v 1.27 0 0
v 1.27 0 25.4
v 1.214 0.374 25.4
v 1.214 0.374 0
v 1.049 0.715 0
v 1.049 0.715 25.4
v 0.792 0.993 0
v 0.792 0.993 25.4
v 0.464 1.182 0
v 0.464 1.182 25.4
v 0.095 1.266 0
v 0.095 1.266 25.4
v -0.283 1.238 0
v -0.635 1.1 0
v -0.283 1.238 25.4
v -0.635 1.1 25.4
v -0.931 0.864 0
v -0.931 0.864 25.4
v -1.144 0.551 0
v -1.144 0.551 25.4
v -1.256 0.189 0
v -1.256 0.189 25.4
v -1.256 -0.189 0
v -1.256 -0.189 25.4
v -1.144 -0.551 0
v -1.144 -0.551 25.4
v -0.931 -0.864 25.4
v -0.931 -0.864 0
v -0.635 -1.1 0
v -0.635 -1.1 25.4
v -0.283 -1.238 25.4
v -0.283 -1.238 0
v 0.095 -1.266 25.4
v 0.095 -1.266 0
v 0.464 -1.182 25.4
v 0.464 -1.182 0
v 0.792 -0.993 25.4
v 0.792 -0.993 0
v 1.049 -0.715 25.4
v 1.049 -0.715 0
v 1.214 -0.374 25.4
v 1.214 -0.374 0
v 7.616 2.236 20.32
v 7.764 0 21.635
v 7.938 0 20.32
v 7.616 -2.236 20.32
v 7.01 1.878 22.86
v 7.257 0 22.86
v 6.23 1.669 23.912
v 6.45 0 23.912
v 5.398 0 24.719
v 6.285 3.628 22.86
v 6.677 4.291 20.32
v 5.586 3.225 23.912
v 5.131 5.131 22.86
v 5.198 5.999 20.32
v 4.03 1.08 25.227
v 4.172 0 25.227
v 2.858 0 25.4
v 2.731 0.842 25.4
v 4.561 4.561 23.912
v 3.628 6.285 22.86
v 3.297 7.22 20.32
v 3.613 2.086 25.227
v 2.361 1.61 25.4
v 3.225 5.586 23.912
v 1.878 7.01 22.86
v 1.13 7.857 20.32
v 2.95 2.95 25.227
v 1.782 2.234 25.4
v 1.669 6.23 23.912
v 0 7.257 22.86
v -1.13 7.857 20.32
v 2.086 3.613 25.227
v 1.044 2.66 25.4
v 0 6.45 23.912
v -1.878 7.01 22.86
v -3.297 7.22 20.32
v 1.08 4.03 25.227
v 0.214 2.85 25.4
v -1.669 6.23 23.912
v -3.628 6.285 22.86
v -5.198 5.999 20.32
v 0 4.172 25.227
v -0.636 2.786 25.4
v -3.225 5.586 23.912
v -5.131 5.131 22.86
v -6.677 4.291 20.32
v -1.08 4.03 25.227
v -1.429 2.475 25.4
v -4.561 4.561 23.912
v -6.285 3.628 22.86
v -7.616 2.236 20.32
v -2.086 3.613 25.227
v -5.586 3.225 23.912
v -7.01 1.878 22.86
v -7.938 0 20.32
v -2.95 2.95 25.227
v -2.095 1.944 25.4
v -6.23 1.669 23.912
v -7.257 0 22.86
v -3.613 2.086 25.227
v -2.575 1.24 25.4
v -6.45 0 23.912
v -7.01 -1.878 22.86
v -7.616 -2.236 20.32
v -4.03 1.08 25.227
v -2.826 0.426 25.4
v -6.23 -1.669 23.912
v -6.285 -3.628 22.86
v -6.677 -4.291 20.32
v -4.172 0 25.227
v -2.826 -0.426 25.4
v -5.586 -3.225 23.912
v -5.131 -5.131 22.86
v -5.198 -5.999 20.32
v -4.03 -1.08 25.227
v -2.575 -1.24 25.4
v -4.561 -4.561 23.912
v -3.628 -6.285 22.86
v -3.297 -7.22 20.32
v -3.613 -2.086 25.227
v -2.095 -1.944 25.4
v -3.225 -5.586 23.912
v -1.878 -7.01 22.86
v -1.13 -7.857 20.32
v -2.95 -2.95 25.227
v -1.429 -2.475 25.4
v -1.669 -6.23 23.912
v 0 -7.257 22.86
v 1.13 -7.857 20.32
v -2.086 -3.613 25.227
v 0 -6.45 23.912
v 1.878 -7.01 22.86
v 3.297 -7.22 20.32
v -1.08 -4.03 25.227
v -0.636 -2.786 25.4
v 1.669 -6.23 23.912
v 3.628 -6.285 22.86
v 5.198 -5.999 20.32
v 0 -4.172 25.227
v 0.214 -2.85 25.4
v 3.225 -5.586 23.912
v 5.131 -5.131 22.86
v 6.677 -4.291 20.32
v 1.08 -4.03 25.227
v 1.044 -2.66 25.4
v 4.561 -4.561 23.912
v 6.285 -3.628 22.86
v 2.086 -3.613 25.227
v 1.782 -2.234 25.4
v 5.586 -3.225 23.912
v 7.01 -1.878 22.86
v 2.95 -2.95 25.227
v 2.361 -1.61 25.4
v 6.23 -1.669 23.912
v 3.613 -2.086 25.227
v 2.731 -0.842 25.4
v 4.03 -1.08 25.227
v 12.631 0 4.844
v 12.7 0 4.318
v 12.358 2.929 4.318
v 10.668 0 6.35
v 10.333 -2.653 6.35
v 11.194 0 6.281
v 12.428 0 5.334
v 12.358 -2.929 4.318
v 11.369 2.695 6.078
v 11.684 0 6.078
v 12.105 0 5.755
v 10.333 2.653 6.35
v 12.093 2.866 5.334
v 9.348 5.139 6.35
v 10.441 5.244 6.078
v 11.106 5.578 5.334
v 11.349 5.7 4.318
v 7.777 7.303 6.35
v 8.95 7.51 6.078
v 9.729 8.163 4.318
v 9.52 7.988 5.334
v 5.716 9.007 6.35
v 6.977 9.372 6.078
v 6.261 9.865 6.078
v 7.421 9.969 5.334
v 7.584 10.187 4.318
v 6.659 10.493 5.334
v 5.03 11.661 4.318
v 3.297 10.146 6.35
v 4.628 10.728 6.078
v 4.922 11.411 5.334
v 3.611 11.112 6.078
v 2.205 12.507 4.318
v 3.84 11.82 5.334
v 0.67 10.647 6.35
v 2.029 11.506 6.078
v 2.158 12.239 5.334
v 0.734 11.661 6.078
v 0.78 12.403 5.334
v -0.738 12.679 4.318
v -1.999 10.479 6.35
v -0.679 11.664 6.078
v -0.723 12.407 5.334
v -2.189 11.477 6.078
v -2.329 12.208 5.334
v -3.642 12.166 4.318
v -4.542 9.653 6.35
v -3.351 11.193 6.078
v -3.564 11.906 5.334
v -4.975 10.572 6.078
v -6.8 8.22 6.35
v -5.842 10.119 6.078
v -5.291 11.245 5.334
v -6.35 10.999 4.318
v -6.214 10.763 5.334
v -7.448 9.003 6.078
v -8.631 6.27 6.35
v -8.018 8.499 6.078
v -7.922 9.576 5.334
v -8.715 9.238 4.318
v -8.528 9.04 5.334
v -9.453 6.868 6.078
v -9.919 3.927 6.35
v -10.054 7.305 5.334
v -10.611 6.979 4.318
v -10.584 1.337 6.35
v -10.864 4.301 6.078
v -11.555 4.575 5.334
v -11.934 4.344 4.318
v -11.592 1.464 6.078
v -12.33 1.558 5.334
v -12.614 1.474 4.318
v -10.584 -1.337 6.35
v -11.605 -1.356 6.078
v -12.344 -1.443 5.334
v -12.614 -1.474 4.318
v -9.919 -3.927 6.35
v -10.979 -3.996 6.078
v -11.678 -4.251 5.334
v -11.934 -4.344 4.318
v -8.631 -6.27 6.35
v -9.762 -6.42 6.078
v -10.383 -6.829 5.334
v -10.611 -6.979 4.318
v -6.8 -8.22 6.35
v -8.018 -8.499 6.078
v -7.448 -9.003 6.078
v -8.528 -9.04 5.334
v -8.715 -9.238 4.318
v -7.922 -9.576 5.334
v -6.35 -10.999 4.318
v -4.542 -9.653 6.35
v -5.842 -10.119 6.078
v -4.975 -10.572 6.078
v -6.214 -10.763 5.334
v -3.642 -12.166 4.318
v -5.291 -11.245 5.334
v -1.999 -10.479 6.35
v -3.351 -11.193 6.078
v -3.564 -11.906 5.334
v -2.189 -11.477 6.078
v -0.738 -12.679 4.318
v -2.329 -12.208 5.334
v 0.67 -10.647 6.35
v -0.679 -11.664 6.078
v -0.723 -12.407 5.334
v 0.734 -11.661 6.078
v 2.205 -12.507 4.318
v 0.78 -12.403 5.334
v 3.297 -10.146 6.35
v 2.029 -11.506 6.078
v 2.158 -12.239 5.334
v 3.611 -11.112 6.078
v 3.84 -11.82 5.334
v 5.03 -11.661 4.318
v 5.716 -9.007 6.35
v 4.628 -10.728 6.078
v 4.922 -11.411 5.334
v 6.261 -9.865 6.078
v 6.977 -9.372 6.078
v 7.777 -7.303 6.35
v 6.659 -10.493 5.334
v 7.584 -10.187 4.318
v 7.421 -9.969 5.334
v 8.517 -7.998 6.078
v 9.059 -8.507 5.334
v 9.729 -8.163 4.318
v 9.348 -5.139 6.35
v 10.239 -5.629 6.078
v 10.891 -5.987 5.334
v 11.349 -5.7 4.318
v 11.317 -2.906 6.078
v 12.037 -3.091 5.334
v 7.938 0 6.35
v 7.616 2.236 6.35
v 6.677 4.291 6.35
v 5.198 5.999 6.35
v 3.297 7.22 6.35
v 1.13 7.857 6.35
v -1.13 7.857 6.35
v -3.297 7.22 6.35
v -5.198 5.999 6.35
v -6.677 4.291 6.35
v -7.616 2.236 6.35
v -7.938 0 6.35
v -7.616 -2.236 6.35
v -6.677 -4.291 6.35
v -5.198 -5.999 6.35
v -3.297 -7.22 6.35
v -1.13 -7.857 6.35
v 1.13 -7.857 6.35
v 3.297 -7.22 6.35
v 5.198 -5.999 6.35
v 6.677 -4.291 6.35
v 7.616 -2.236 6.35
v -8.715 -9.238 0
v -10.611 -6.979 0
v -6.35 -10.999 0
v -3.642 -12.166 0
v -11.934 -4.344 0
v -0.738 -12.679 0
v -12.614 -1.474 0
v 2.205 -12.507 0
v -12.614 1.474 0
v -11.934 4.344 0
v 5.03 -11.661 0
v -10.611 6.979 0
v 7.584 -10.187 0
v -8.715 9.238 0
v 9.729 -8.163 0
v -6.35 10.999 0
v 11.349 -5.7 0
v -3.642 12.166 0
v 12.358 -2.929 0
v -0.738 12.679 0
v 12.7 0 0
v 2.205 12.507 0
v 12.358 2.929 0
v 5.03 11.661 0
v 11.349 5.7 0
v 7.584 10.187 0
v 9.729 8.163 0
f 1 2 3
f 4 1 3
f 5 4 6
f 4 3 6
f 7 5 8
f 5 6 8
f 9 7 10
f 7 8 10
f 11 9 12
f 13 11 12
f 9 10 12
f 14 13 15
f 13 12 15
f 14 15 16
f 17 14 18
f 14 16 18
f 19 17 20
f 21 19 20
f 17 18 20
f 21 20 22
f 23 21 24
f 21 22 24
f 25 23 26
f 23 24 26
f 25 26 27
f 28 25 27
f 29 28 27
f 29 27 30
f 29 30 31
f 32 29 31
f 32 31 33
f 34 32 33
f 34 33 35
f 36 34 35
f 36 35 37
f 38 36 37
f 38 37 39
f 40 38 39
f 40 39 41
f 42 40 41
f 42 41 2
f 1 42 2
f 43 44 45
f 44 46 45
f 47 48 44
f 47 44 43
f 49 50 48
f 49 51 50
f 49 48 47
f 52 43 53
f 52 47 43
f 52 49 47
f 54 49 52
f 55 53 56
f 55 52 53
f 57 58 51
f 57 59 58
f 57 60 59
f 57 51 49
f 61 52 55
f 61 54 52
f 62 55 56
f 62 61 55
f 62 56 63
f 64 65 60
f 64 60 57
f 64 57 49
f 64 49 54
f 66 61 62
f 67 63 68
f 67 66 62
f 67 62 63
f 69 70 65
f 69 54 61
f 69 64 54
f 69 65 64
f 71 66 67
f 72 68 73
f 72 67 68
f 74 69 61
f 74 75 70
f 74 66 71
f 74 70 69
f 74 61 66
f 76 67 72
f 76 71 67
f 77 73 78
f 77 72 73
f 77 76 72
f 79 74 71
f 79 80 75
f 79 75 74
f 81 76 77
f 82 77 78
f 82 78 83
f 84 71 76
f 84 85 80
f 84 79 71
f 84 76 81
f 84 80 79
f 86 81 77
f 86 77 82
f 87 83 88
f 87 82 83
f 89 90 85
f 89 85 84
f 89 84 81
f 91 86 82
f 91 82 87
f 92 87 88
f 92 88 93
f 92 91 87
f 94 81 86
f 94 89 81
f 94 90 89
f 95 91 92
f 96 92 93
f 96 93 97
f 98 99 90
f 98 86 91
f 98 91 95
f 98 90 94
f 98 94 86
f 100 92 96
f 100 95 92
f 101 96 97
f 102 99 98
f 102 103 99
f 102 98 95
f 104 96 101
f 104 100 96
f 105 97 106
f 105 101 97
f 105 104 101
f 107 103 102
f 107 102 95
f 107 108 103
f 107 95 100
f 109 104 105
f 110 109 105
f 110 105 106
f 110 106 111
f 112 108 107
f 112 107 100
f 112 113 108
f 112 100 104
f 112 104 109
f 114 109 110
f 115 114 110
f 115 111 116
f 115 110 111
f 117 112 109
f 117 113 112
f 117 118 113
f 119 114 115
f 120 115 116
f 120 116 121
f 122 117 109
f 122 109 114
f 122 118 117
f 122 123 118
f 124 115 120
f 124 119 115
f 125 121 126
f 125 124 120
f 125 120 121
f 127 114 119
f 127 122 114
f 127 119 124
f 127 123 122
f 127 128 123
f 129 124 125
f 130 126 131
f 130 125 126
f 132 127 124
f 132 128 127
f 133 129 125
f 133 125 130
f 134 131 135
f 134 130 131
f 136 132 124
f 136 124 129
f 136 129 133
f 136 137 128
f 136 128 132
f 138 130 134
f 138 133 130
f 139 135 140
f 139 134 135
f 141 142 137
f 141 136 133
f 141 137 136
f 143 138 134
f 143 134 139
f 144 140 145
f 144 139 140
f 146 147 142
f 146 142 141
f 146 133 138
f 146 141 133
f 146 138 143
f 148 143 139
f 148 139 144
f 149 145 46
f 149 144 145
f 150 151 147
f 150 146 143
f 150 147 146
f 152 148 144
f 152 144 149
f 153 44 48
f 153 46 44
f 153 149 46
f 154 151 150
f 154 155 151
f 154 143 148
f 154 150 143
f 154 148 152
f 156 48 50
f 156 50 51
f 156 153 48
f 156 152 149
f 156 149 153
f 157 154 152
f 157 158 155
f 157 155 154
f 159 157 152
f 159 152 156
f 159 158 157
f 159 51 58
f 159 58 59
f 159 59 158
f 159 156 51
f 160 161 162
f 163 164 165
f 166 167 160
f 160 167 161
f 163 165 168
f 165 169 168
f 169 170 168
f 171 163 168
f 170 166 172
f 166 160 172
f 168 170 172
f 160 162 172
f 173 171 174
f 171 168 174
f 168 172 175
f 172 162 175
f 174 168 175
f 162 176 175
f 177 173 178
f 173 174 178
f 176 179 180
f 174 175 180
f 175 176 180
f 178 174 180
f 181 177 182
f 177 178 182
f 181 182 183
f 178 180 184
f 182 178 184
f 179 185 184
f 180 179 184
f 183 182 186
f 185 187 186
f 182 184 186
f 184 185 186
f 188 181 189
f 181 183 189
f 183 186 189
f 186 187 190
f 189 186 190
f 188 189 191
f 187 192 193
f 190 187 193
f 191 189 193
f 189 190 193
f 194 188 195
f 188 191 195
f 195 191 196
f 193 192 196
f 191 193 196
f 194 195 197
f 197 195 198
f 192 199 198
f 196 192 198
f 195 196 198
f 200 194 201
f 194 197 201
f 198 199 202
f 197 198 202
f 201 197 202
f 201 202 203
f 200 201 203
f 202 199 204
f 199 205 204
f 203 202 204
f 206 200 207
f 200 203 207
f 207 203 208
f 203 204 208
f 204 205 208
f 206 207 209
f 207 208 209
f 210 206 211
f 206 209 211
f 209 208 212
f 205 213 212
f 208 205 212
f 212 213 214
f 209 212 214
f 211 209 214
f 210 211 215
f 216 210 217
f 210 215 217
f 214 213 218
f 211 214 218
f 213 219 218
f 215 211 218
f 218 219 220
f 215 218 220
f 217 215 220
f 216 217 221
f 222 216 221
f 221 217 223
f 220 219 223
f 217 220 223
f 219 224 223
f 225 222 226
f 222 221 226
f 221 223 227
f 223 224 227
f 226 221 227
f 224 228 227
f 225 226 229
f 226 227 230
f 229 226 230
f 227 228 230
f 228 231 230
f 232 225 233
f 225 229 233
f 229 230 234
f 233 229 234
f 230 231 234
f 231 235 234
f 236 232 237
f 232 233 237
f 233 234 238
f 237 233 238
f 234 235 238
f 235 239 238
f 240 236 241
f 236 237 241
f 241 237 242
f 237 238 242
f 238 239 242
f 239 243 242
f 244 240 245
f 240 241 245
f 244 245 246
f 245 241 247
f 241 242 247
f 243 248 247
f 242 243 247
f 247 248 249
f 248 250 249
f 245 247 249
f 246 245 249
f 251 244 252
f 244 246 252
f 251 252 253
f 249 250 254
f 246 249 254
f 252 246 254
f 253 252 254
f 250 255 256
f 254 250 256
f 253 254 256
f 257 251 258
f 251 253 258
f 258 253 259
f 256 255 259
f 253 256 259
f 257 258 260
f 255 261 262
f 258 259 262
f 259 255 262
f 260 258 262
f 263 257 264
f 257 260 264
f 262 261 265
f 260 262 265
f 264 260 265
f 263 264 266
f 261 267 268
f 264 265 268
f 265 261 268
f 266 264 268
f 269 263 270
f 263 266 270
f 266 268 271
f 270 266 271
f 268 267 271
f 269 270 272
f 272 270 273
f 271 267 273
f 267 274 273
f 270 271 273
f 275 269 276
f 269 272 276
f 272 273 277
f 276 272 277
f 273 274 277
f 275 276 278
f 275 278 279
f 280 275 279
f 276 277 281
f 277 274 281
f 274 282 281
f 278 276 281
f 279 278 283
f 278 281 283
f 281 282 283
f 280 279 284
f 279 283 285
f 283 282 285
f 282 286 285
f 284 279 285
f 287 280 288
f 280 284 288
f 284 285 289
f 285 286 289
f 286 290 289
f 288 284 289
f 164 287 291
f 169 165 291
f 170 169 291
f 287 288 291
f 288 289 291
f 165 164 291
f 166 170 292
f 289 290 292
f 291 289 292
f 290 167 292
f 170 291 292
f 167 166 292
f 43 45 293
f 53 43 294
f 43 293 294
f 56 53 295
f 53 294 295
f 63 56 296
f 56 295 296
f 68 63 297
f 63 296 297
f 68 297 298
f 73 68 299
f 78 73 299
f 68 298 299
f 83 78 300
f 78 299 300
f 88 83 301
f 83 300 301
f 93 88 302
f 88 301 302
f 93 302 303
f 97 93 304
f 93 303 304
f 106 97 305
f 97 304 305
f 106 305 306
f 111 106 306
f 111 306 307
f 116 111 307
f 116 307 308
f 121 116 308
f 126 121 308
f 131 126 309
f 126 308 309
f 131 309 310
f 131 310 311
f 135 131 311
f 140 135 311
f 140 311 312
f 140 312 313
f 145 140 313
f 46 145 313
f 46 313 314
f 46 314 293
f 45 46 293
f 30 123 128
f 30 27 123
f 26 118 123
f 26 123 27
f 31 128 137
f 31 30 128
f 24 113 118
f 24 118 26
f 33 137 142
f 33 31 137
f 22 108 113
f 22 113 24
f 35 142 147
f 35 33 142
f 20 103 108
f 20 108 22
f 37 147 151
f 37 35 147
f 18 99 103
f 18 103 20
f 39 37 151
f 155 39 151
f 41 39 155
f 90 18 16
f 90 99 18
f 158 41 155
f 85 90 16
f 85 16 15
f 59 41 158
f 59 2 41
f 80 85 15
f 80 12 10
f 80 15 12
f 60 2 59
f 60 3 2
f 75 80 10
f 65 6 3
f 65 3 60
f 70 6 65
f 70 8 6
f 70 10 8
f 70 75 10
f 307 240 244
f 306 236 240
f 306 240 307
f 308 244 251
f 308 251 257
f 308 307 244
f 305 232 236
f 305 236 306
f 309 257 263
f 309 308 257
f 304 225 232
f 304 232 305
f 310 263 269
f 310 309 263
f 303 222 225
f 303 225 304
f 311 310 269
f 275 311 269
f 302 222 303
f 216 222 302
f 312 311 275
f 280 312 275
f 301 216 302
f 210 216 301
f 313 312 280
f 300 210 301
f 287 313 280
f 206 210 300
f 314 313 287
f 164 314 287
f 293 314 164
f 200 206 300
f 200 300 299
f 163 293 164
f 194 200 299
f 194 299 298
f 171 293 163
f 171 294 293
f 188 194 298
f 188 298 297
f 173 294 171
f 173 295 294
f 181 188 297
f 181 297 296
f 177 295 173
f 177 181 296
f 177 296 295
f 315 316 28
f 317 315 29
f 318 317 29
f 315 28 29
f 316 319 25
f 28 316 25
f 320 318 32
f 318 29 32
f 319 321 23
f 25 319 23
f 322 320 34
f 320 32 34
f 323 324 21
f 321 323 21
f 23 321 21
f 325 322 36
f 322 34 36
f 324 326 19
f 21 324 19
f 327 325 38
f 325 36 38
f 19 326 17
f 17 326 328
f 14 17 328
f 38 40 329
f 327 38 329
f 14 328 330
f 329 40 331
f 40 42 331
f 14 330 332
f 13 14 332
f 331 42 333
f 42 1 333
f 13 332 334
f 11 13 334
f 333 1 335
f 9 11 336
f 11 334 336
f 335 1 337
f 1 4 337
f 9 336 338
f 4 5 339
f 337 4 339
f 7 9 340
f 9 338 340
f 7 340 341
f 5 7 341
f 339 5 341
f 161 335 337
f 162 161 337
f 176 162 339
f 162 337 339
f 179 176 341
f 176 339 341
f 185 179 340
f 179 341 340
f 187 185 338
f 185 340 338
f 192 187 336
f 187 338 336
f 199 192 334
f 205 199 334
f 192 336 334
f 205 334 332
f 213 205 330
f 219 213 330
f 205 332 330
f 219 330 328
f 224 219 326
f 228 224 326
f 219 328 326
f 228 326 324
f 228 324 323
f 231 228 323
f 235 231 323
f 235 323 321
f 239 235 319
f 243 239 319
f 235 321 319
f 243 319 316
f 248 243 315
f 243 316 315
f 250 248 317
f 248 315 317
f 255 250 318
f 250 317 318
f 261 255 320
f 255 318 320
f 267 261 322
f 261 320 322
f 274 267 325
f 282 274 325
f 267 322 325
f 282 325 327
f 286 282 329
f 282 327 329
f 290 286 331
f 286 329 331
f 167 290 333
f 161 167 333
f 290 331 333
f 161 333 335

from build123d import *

# Parameters (mm, degrees)
F0_R     = 7.9375
F2_DEPTH = 25.4
F1_R     = 12.7
F3_DEPTH = 6.35
F4_R     = 5.08
F5_R     = 2.032
F6_R     = 1.27
F7_DEPTH = 38.1


with BuildPart() as f2:
    # F0 (on Top) → F2 (new body)
    with BuildSketch(Plane.XY):
        Circle(F0_R)
    extrude(amount=F2_DEPTH)

    # F1 (on Top) → F3 (join)
    with BuildSketch(Plane.XY):
        Circle(F1_R)
    extrude(amount=F3_DEPTH)

    # F4
    f4_edges = [f2.edges().sort_by_distance(p)[0] for p in [
        (-7.9375, 0, 25.4),
    ]]
    fillet(f4_edges, radius=F4_R)

    # F5
    f5_edges = [f2.edges().sort_by_distance(p)[0] for p in [
        (-12.7, 0, 6.35),
    ]]
    fillet(f5_edges, radius=F5_R)

    # F6 (on face) → F7 (cut)
    with BuildSketch(Plane.XY.offset(25.4)):
        Circle(F6_R)
    extrude(amount=-F7_DEPTH, mode=Mode.SUBTRACT)


solid = f2.part
